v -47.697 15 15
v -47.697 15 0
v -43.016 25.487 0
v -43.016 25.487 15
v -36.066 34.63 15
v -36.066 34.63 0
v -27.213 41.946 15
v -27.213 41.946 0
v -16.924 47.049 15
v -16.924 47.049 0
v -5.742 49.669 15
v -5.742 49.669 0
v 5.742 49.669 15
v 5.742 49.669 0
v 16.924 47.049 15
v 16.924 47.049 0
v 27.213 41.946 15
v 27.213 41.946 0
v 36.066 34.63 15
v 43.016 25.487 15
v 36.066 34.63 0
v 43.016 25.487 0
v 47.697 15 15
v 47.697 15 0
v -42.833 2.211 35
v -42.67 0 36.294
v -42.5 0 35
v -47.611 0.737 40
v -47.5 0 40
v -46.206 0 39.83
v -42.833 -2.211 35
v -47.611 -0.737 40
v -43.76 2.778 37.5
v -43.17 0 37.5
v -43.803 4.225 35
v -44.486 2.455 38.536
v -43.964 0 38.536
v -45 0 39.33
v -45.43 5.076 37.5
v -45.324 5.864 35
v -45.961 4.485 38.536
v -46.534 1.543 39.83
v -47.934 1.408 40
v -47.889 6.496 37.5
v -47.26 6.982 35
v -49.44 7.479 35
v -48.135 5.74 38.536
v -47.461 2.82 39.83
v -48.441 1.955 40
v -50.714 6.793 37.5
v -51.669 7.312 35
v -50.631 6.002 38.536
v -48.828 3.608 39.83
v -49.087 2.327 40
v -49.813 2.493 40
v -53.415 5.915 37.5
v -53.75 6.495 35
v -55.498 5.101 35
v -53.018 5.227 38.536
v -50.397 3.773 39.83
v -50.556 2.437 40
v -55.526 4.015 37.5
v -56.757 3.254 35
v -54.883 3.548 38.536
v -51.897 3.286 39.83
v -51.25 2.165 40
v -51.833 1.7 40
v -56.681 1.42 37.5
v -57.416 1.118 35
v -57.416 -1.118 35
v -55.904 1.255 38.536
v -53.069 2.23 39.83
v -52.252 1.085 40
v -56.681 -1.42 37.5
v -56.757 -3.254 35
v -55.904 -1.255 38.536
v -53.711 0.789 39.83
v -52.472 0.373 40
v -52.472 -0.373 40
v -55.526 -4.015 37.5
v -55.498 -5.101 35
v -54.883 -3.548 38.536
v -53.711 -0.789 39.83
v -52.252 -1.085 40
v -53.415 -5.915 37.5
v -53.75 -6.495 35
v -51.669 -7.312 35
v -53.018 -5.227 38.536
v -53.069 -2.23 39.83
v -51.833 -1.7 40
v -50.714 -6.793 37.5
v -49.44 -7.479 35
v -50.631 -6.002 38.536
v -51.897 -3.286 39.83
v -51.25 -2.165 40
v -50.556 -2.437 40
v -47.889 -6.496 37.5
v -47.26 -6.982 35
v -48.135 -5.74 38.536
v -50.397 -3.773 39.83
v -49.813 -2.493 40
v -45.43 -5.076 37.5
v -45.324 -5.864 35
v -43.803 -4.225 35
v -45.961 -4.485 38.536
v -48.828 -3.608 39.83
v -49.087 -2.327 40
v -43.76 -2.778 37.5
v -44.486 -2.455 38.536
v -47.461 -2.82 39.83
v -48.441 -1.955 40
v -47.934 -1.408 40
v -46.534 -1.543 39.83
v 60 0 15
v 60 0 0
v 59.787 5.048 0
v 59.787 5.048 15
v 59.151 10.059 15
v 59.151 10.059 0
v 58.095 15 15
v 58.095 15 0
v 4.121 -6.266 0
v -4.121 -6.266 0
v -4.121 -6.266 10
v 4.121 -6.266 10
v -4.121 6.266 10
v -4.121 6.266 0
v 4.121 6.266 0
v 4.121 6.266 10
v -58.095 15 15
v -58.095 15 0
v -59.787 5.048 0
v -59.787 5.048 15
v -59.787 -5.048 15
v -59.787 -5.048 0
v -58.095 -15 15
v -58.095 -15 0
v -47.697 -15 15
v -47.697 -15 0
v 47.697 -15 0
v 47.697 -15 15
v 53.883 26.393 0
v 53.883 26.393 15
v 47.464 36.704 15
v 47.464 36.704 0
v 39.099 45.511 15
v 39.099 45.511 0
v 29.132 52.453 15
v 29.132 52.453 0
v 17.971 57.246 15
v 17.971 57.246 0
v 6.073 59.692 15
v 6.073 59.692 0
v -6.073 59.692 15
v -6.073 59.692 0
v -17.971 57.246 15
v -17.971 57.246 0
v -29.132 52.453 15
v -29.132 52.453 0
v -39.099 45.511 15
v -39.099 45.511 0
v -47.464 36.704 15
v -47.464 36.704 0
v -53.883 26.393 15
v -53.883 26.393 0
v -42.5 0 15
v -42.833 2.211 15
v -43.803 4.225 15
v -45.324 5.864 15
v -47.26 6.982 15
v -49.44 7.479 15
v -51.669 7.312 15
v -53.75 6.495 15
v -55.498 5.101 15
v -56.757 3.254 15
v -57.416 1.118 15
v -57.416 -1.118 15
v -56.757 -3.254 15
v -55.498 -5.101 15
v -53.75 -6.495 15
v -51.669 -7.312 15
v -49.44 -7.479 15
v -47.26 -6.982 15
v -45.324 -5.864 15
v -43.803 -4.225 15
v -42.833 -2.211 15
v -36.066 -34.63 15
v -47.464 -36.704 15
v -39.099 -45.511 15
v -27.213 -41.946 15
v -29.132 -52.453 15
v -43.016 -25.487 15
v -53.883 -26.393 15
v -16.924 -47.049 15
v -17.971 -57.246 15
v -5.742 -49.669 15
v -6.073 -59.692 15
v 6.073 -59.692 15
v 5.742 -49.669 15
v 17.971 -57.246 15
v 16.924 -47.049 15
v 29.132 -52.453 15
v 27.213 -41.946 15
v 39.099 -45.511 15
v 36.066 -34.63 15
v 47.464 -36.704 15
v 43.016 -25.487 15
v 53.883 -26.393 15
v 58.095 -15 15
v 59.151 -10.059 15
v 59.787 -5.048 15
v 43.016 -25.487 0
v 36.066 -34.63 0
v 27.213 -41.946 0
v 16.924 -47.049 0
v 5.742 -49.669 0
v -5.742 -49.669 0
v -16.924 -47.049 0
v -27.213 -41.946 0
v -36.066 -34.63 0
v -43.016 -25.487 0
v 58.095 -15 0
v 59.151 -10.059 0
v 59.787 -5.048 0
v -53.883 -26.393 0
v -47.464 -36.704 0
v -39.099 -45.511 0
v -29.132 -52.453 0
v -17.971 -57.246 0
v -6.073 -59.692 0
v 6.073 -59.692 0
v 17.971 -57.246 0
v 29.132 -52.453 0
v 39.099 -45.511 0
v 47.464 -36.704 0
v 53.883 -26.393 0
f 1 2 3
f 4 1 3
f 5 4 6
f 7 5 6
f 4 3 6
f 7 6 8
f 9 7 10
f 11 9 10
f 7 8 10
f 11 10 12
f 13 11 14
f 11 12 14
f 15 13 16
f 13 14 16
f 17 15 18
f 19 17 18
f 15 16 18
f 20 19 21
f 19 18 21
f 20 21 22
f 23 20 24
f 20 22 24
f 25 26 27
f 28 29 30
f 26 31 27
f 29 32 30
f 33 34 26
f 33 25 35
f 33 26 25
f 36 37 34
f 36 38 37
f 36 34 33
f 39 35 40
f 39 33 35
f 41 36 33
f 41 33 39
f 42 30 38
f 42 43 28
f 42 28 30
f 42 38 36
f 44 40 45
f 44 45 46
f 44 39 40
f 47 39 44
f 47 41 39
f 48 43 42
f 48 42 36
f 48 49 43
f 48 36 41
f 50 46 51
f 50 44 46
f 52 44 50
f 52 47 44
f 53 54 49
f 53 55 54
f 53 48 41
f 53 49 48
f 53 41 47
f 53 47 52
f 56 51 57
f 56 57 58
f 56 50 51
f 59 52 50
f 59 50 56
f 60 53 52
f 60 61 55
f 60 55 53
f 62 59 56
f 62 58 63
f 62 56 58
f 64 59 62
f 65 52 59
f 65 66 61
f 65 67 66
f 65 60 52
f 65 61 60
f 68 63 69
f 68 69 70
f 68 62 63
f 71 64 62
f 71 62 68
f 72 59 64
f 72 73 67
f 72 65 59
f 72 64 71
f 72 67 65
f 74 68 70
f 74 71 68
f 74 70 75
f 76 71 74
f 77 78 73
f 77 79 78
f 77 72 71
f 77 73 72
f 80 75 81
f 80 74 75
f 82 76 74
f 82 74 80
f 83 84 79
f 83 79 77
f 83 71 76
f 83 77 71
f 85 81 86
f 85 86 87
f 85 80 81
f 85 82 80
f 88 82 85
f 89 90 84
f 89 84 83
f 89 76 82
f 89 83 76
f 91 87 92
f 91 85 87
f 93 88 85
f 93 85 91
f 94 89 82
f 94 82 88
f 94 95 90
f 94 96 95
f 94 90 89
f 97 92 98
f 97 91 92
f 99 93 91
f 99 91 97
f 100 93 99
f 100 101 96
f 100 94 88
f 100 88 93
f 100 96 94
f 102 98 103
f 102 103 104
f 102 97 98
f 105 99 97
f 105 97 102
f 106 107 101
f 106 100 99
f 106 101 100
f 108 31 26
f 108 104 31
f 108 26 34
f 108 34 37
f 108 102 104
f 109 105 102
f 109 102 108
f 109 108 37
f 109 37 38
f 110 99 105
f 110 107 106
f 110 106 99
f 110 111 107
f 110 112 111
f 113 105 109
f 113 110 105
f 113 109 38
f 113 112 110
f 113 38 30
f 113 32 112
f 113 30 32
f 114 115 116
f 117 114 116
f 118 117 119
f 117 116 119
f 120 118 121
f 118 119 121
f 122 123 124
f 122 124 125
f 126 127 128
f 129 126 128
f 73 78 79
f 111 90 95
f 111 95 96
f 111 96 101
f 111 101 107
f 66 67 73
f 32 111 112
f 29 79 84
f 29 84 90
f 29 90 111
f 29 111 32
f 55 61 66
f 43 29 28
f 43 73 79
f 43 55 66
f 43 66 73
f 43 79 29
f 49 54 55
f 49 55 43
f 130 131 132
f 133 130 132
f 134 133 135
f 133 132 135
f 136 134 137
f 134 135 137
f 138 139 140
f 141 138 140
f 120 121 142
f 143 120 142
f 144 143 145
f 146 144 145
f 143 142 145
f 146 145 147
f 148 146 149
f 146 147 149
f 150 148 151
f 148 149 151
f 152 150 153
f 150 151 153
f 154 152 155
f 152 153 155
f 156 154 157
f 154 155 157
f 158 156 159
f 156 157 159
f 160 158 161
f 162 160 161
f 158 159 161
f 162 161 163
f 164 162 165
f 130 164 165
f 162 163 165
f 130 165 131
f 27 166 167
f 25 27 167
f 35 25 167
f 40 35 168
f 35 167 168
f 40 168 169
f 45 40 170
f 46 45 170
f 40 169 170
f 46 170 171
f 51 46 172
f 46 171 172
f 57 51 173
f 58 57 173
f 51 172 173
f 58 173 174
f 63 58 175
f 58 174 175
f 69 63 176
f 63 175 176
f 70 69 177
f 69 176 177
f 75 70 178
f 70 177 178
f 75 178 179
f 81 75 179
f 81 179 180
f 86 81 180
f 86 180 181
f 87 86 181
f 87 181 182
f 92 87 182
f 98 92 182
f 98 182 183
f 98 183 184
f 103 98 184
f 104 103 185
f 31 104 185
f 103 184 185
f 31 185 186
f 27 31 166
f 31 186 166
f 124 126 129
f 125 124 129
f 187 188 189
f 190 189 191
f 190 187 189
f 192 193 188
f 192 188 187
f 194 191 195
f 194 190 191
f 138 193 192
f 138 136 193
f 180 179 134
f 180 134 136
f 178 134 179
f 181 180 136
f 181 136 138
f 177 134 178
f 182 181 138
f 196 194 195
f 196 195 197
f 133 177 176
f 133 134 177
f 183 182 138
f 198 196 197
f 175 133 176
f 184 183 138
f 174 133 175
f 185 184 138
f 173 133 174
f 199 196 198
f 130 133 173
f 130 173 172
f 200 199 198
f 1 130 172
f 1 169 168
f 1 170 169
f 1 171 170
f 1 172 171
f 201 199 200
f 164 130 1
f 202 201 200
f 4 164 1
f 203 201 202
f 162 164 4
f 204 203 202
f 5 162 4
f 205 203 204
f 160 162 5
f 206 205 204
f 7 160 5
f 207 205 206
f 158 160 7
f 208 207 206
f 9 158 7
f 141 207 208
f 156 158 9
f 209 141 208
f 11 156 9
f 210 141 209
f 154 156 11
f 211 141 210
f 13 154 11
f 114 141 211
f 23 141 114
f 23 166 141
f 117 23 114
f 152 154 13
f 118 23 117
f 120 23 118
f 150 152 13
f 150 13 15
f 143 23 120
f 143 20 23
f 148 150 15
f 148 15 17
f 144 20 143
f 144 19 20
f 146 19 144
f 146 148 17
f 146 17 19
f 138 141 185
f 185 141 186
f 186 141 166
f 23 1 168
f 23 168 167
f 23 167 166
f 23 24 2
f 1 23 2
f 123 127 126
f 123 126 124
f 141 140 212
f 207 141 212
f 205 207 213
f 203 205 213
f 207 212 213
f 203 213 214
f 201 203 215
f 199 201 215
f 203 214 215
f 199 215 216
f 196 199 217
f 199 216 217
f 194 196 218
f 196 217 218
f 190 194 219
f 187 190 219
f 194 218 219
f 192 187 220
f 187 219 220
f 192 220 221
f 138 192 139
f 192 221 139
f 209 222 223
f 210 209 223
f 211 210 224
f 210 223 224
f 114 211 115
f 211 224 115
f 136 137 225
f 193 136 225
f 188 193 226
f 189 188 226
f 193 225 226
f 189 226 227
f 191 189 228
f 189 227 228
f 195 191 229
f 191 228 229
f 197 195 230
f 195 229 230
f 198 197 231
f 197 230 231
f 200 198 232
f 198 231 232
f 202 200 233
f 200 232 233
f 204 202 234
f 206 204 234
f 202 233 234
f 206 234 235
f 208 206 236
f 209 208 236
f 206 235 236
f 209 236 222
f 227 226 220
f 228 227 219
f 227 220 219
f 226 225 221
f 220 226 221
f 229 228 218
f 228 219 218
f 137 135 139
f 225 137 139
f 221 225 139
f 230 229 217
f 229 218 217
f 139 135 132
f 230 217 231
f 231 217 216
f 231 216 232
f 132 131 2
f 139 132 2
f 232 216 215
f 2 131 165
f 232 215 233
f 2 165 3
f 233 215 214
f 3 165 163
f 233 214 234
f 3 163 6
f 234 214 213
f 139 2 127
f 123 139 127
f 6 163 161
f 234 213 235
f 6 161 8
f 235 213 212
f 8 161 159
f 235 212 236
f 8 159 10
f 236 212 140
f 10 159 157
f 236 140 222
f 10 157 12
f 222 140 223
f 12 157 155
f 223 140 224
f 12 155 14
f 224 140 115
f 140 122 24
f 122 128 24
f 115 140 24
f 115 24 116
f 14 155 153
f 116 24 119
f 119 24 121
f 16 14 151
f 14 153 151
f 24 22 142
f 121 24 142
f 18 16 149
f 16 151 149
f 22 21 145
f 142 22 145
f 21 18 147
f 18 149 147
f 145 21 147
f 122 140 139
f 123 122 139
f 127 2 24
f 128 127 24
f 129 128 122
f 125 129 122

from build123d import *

# Parameters (mm, degrees)
F1_DEPTH = 15
F2_R     = 7.5
F3_DEPTH = 25
F4_R     = 5
F5_W     = 8.242
F5_H     = 12.533
F6_DEPTH = 10


# Not quite as in the source:
# - a feature names something its author has since deleted; it is built from what else it names


with BuildPart() as f1:
    # F0 (on Top) → F1 (new body)
    with BuildSketch(Plane.XY):
        with BuildLine():
            Line((47.6969600708, 15), (58.0947501931, 15))
            ThreePointArc((58.0947501931, 15), (0, 60), (-58.0947501931, 15))
            Line((-58.0947501931, 15), (-47.6969600708, 15))
            ThreePointArc((-47.6969600708, 15), (0, 50), (47.6969600708, 15))
        make_face()
        with BuildLine():
            Line((-47.6969600708, 15), (-58.0947501931, 15))
            ThreePointArc((-58.0947501931, 15), (-60, 0), (-58.0947501931, -15))
            Line((-58.0947501931, -15), (-47.6969600708, -15))
            ThreePointArc((-47.6969600708, -15), (-50, 0), (-47.6969600708, 15))
        make_face()
        with BuildLine():
            ThreePointArc((-58.0947501931, -15), (0, -60), (58.0947501931, -15))
            Line((58.0947501931, -15), (47.6969600708, -15))
            ThreePointArc((47.6969600708, -15), (0, -50), (-47.6969600708, -15))
            Line((-47.6969600708, -15), (-58.0947501931, -15))
        make_face()
        with BuildLine():
            ThreePointArc((58.0947501931, -15), (59.521781776, -7.560257549), (60, 0))
            ThreePointArc((60, 0), (59.521781776, 7.560257549), (58.0947501931, 15))
            Line((58.0947501931, 15), (47.6969600708, 15))
            ThreePointArc((47.6969600708, 15), (49.4208862908, 7.5878849641), (50, 0))
            ThreePointArc((50, 0), (49.4208862908, -7.5878849641), (47.6969600708, -15))
            Line((47.6969600708, -15), (58.0947501931, -15))
        make_face()
        with BuildLine():
            ThreePointArc((50, 0), (49.4208862908, 7.5878849641), (47.6969600708, 15))
            Line((47.6969600708, 15), (-47.6969600708, 15))
            ThreePointArc((-47.6969600708, 15), (-50, 0), (-47.6969600708, -15))
            Line((-47.6969600708, -15), (47.6969600708, -15))
            ThreePointArc((47.6969600708, -15), (49.4208862908, -7.5878849641), (50, 0))
        make_face()
    extrude(amount=F1_DEPTH)

    # F2 (on face) → F3 (join)
    with BuildSketch(Plane.XY.offset(15)):
        with Locations((-50, 0)):
            Circle(F2_R)
    extrude(amount=F3_DEPTH)

    # F4
    f4_edges = [f1.edges().sort_by_distance(p)[0] for p in [
        (-57.5, 0, 40),
    ]]
    fillet(f4_edges, radius=F4_R)

    # F5 (on face) → F6 (cut)
    with BuildSketch(Plane(origin=(0, 0, 0), x_dir=(1, 0, 0), z_dir=(0, 0, -1))):
        Rectangle(F5_W, F5_H)
    extrude(amount=-F6_DEPTH, mode=Mode.SUBTRACT)


solid = f1.part
